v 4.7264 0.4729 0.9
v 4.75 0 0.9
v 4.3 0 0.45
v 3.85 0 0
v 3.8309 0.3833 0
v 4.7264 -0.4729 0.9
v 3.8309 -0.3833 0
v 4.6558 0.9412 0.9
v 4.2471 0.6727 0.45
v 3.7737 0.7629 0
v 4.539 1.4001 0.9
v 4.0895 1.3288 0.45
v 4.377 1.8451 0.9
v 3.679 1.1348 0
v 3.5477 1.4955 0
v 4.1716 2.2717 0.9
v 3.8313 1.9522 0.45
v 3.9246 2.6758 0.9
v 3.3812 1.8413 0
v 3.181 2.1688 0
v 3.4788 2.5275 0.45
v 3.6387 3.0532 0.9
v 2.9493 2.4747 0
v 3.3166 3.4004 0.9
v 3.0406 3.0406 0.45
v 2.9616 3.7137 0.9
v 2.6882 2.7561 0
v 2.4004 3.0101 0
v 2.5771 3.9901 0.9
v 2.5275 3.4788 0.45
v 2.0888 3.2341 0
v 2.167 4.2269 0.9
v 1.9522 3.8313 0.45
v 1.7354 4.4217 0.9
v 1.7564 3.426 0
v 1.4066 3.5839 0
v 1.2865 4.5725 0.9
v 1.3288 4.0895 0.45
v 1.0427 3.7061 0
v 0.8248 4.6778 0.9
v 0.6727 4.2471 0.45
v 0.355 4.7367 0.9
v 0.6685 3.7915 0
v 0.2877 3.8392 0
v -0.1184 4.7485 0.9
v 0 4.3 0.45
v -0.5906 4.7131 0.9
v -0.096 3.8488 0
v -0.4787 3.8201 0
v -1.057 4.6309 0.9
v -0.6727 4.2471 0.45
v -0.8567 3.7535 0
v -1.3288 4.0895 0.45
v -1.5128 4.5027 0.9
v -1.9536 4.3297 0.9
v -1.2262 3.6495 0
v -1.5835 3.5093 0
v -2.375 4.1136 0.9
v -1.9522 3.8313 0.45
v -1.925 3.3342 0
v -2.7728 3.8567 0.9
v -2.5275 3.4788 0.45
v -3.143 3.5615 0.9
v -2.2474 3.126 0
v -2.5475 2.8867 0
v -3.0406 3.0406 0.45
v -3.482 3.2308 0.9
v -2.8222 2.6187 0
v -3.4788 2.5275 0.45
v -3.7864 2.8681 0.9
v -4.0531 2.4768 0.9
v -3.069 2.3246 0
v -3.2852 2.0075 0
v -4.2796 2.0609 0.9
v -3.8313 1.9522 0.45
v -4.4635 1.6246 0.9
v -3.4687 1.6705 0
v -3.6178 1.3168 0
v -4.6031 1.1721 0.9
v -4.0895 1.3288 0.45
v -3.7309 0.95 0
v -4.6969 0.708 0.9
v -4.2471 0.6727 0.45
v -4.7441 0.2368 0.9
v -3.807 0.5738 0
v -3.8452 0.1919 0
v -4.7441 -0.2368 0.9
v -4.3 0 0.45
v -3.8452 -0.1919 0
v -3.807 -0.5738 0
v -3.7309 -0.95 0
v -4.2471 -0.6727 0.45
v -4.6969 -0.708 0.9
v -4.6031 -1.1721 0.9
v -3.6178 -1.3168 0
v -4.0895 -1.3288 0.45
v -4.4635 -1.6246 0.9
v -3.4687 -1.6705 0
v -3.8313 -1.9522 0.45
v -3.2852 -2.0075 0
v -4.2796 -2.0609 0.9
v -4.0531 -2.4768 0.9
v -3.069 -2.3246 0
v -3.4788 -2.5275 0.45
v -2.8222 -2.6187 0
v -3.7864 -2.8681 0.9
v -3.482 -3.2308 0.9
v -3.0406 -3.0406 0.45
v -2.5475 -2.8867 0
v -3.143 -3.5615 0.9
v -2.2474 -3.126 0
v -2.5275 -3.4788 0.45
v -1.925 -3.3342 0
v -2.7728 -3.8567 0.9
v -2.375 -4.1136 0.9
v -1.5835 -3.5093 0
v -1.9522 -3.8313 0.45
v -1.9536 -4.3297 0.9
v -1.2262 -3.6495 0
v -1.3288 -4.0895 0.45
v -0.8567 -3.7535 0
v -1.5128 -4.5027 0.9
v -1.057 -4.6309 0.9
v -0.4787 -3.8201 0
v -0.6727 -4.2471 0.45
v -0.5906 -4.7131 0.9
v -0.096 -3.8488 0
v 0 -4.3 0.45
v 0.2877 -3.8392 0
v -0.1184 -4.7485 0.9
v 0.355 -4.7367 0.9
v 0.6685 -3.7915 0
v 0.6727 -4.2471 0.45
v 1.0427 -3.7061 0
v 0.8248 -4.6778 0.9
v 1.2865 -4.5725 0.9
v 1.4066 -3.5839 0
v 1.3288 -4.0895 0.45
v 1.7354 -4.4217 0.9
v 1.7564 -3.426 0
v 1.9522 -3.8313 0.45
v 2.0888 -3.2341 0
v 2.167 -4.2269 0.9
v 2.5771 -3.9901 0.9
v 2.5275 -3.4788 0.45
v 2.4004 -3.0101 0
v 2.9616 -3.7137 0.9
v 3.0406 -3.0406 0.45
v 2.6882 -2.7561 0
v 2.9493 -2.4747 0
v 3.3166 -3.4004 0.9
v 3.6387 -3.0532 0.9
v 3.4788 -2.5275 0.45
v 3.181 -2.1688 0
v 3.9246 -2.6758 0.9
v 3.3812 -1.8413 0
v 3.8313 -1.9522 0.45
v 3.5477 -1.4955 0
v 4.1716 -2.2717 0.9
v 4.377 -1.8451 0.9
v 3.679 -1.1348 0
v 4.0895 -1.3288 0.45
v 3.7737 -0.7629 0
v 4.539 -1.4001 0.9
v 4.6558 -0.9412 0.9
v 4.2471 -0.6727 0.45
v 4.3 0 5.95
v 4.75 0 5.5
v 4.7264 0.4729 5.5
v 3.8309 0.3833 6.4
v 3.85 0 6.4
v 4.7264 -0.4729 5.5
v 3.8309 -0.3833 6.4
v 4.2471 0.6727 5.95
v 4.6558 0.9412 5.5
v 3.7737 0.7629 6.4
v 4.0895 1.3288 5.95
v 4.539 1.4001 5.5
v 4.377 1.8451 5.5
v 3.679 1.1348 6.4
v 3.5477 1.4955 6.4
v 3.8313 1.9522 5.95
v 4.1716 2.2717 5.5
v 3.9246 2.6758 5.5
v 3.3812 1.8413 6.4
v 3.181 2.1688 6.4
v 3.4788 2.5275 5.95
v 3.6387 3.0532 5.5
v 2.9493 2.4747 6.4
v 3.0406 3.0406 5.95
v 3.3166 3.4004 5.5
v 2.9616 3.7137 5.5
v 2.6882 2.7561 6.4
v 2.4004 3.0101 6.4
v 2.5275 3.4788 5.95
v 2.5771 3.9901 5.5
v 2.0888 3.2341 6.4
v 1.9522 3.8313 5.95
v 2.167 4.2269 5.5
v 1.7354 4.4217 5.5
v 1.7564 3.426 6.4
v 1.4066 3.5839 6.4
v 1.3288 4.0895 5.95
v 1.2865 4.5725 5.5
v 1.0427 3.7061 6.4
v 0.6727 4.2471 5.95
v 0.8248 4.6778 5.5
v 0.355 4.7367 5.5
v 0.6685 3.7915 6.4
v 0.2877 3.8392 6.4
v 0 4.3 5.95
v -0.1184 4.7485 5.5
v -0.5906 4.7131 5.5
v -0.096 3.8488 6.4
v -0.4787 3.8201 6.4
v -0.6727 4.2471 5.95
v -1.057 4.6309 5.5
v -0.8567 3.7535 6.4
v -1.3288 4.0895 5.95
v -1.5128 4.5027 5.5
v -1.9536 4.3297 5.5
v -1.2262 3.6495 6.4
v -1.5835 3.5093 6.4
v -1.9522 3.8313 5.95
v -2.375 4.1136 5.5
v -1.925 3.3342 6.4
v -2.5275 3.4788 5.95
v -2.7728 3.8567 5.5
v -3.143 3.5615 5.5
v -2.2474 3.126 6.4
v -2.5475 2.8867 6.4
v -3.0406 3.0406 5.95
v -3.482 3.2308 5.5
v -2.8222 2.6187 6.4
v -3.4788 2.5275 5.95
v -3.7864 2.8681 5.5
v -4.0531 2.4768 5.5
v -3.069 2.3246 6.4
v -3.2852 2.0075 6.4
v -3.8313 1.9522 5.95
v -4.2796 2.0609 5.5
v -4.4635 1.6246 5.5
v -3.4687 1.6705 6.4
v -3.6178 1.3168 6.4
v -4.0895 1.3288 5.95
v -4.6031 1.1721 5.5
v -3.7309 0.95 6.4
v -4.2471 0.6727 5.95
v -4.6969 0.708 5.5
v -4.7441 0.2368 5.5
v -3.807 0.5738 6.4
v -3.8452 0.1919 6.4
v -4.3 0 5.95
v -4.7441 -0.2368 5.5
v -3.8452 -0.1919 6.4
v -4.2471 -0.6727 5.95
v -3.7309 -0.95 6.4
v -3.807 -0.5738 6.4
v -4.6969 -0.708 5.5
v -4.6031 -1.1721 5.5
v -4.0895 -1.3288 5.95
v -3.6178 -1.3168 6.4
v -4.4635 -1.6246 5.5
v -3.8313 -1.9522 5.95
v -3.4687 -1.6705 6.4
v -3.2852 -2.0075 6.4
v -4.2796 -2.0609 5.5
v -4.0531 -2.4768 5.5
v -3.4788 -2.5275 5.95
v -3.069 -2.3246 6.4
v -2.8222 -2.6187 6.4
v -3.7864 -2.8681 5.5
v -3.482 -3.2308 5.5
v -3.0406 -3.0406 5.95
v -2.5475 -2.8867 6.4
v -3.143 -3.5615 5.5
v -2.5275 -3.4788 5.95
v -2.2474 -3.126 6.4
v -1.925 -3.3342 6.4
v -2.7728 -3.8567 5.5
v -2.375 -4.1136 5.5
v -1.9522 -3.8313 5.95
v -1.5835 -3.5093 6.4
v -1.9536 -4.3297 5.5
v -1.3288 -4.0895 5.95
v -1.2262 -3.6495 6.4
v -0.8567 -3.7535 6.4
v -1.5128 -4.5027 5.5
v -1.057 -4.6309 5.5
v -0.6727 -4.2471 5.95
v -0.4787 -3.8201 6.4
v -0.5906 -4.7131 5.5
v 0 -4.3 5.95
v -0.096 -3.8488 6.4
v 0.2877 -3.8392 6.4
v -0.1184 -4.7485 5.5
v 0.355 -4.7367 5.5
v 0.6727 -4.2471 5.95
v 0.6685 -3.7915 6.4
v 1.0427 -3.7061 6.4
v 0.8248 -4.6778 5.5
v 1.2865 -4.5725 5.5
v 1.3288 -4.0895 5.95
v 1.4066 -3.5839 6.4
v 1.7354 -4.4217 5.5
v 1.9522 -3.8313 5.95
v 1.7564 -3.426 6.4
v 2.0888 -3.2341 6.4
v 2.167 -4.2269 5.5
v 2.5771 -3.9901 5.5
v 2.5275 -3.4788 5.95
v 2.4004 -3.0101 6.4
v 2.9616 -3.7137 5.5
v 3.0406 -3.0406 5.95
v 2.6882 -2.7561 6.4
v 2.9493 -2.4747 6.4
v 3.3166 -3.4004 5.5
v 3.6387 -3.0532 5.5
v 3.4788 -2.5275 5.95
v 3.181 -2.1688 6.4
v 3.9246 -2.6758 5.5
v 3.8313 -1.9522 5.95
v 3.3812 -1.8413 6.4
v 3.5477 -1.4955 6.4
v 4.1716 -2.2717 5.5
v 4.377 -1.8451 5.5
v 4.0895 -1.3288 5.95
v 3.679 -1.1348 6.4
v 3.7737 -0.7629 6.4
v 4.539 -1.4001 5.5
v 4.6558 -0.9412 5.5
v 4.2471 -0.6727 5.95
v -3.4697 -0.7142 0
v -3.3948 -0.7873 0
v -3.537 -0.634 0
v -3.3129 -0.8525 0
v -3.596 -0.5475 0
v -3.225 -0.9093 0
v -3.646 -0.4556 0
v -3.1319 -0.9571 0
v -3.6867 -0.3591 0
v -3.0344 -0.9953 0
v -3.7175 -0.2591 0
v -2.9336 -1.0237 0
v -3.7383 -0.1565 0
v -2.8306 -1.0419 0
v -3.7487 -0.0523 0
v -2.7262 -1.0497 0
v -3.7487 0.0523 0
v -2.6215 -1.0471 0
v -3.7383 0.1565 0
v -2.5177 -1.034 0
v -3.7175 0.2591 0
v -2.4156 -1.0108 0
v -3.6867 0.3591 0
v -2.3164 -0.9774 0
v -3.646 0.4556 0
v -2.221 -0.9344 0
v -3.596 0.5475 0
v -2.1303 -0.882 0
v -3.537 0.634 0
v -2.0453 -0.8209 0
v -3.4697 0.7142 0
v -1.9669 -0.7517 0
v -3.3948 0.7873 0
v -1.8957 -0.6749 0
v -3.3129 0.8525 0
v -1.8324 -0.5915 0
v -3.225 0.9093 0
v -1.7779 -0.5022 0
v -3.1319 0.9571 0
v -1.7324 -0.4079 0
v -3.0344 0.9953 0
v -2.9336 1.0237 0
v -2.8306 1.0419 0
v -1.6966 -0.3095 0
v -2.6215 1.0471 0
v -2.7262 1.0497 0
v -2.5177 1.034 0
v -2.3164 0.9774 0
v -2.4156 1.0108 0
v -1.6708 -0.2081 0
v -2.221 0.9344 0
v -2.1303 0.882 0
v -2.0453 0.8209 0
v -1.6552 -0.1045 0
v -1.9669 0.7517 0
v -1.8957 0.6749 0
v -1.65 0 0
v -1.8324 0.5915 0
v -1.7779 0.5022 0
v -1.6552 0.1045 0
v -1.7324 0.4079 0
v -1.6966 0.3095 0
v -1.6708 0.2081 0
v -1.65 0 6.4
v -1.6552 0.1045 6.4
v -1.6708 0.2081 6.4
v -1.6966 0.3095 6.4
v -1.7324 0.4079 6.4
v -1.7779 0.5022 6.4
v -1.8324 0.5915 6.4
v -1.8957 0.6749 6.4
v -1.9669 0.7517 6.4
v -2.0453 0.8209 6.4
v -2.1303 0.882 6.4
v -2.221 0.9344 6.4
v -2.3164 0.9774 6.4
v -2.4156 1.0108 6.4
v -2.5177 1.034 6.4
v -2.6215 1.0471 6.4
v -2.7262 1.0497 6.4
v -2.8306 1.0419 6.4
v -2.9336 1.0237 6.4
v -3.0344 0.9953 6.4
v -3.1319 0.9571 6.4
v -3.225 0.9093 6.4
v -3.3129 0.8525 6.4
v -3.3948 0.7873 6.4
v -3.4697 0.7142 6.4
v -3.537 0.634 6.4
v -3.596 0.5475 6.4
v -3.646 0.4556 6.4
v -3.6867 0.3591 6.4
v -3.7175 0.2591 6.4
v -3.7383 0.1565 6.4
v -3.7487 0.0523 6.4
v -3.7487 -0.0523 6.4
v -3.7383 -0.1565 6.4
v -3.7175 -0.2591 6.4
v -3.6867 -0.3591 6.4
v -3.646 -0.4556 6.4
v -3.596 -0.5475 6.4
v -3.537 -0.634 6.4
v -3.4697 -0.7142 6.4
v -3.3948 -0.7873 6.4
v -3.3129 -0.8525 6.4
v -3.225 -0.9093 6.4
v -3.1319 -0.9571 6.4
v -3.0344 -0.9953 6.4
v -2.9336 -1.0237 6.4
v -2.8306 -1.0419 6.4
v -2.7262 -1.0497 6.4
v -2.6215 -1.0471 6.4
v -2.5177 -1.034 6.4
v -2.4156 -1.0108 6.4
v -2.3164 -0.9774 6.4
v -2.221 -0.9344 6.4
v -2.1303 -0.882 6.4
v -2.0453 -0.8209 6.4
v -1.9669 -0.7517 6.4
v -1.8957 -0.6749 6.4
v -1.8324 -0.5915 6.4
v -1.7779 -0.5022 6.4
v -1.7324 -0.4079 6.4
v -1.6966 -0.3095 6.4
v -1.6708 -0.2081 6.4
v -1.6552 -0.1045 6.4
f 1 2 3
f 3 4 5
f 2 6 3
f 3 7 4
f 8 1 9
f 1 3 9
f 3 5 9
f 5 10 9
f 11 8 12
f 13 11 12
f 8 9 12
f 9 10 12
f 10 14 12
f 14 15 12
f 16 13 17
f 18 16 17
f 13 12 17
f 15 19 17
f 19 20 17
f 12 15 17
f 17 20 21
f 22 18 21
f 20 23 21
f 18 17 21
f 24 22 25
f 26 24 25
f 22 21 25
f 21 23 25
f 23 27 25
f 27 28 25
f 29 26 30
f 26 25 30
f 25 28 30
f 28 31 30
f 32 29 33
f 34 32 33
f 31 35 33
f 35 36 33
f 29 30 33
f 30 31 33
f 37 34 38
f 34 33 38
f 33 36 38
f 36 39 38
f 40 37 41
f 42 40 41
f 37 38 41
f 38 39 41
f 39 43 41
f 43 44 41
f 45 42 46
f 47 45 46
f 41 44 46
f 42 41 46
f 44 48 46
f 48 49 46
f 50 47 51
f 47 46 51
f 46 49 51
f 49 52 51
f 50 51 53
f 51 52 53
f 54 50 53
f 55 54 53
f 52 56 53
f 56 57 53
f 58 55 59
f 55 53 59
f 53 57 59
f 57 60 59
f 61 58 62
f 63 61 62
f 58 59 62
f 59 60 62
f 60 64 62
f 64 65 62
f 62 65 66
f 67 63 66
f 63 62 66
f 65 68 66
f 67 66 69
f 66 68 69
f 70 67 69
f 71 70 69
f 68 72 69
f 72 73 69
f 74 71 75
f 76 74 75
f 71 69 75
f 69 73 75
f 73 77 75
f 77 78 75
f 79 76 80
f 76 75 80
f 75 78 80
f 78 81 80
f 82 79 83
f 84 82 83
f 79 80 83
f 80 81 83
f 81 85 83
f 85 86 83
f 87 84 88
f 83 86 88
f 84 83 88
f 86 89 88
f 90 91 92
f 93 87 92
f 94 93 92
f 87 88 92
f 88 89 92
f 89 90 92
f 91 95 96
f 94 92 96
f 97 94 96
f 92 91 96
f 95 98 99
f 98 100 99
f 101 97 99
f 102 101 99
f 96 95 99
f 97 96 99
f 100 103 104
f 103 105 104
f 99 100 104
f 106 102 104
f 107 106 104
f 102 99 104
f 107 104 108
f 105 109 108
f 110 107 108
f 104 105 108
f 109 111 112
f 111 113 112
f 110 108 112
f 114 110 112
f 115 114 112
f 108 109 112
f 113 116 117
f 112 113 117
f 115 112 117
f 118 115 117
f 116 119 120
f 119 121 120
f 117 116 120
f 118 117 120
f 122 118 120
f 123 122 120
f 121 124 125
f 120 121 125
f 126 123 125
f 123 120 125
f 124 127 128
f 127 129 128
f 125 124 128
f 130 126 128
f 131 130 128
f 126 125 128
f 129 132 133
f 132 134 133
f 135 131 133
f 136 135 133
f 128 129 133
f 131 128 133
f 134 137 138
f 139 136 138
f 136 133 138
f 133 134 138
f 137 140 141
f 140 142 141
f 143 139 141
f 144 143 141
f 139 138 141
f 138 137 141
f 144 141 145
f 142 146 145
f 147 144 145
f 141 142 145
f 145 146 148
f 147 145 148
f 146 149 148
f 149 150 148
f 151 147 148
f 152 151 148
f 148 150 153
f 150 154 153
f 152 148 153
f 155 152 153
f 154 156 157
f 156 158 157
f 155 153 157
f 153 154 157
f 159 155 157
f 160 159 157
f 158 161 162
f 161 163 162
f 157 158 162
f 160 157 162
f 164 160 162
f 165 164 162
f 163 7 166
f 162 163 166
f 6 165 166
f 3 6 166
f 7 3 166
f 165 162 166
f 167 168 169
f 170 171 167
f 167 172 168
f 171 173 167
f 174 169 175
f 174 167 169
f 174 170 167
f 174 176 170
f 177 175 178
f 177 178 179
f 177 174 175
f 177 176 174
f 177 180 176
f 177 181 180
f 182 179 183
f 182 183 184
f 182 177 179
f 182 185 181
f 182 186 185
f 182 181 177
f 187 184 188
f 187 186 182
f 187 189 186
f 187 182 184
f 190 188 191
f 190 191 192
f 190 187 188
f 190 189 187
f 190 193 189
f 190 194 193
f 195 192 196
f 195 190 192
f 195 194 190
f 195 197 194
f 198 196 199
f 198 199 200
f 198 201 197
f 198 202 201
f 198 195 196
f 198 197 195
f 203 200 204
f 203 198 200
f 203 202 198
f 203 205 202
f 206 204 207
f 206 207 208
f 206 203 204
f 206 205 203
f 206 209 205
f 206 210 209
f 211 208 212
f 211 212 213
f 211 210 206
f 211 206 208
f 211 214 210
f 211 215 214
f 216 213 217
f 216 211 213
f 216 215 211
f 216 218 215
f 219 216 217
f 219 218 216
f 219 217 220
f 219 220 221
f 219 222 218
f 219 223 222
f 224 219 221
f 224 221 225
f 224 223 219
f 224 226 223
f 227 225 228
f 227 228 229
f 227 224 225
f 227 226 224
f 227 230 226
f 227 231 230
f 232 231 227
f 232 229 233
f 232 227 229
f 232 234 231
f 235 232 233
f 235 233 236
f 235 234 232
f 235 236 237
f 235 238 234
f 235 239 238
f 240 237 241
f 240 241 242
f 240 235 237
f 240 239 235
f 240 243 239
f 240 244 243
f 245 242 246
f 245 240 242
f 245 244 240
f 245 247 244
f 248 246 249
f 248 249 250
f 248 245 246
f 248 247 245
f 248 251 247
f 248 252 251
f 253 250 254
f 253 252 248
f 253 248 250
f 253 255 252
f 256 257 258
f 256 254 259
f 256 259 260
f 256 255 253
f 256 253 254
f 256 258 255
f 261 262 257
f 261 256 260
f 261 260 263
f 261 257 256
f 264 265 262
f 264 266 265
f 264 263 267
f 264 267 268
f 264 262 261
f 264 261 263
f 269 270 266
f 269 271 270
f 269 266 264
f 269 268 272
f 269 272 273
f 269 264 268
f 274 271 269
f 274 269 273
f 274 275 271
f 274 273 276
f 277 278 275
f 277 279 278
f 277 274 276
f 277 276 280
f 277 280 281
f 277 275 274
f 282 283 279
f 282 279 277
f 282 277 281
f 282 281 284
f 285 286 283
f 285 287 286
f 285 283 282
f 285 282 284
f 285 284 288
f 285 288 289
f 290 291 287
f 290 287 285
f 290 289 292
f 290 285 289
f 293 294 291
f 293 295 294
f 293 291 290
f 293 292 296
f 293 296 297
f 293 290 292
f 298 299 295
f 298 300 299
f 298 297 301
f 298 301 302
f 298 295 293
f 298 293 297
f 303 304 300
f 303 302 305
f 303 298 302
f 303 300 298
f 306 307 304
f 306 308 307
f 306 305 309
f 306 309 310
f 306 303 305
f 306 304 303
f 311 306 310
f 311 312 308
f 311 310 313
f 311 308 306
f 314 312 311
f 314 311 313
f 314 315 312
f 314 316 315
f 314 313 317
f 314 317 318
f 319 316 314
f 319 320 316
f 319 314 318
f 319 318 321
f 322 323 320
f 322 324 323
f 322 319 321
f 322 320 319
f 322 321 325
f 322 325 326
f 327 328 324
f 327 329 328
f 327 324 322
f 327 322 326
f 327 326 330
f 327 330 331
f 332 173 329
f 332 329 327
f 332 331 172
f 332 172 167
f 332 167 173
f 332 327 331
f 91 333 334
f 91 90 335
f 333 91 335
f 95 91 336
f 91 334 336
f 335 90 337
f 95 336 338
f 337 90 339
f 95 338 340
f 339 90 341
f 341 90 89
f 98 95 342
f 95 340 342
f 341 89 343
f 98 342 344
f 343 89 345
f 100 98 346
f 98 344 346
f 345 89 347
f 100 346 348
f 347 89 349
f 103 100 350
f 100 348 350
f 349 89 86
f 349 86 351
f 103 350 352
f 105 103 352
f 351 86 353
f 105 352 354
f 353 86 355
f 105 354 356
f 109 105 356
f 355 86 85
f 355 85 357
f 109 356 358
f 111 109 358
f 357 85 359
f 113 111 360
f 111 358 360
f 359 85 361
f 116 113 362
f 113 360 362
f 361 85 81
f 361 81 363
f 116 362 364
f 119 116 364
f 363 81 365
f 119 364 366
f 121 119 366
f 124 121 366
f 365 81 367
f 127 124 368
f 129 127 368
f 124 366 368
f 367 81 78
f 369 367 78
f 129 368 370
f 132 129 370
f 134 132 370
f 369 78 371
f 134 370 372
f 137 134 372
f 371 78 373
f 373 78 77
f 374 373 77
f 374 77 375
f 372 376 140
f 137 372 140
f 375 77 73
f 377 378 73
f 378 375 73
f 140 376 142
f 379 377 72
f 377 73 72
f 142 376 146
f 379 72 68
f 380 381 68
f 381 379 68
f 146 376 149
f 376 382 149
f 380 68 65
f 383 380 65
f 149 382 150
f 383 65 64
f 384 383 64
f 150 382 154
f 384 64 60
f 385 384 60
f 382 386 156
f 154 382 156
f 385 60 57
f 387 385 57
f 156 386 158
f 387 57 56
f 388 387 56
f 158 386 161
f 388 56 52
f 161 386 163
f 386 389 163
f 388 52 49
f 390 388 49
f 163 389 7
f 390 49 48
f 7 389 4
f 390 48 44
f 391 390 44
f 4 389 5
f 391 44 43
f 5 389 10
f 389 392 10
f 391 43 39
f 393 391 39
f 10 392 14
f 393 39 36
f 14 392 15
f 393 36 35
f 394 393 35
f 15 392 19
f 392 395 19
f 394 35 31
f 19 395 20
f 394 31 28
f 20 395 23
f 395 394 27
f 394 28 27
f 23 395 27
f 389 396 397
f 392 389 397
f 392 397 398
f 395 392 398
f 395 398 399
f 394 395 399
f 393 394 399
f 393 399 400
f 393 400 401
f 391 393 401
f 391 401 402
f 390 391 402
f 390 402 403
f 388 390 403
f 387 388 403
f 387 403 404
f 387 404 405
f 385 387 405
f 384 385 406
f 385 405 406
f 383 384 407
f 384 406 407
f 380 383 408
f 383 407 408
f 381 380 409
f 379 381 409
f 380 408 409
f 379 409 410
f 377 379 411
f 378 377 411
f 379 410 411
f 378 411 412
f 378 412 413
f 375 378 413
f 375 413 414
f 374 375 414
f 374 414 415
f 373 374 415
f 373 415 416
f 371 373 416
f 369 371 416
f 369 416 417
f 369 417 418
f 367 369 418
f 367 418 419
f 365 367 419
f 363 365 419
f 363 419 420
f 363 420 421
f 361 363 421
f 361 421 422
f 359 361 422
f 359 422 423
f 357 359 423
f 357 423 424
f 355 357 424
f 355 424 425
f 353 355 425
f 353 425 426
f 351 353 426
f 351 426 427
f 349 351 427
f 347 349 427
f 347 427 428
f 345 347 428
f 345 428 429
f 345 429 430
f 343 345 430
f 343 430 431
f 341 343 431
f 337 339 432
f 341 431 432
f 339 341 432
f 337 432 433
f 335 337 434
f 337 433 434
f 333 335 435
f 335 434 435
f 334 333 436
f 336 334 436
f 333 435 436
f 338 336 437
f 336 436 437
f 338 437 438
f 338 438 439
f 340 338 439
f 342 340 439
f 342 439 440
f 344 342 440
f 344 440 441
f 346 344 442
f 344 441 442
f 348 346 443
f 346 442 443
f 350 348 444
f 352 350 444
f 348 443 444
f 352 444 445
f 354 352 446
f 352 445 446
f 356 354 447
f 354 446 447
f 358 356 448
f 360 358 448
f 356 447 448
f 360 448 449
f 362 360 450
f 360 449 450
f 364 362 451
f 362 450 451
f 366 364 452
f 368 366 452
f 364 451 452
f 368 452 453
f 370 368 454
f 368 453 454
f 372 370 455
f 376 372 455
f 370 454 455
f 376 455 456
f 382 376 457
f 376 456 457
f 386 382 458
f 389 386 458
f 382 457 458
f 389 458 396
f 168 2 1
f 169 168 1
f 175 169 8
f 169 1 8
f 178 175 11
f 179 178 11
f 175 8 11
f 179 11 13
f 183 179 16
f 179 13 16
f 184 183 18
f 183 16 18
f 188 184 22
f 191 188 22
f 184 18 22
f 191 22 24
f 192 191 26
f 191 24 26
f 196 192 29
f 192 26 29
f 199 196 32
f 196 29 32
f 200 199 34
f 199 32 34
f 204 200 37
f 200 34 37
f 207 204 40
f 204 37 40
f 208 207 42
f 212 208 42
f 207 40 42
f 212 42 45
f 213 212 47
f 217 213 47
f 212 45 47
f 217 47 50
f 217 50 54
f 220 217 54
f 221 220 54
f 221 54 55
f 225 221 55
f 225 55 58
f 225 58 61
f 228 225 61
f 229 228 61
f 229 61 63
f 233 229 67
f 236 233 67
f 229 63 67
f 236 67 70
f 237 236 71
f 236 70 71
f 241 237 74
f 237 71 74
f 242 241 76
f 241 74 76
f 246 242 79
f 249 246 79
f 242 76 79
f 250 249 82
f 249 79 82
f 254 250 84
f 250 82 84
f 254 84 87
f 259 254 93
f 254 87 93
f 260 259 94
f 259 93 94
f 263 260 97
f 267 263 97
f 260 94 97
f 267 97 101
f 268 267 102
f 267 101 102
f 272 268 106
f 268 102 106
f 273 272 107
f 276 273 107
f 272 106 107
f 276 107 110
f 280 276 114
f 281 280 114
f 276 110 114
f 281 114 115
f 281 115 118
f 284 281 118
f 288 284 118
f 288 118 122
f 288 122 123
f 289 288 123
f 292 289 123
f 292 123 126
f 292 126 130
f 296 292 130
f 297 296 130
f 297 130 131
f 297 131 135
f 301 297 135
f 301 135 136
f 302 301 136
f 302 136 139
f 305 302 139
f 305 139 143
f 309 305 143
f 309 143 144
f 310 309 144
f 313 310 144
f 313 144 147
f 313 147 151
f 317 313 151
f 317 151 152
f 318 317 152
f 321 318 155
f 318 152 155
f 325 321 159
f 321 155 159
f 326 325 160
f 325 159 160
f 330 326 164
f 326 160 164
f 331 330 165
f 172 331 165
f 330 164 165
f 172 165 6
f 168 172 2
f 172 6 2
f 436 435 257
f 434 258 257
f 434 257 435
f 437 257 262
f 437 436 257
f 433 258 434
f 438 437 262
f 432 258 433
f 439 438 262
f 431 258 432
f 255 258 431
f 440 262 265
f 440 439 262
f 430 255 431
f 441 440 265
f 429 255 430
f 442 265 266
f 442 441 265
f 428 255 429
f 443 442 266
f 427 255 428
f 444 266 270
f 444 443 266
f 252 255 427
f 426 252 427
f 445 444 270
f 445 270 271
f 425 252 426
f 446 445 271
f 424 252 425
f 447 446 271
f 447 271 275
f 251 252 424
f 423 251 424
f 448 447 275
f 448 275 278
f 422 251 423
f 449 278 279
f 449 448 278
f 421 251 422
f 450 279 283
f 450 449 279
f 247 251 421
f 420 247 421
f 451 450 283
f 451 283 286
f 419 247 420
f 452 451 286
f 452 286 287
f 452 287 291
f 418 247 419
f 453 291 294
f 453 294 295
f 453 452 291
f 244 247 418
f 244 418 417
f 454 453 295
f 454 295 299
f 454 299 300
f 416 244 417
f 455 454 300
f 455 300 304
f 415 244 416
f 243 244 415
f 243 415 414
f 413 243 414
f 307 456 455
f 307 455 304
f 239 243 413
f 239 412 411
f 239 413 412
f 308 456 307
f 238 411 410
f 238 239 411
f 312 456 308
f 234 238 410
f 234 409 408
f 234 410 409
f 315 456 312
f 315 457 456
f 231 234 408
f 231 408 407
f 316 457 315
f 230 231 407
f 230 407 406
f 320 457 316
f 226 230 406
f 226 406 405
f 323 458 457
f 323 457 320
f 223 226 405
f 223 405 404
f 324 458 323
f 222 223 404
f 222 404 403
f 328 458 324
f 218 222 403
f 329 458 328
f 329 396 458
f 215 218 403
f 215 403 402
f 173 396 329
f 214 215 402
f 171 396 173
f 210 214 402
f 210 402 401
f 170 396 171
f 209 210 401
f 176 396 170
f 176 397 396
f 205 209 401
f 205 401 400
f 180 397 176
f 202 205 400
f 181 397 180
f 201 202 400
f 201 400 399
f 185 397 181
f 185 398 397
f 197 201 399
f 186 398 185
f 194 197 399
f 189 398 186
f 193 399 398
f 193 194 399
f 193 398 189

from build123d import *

# Parameters (mm, degrees)
F0_R     = 4.75
F1_DEPTH = 6.4
F2_R     = 1.05
F3_DEPTH = 6.401
F4_SIZE  = 0.9


with BuildPart() as f1:
    # F0 (on Top) → F1 (new body)
    with BuildSketch(Plane.XY):
        Circle(F0_R)
    extrude(amount=F1_DEPTH)

    # F2 (on face) → F3 (cut, through all)
    with BuildSketch(Plane.XY.offset(6.4)):
        with Locations((-2.7, 0)):
            Circle(F2_R)
    extrude(amount=-F3_DEPTH, mode=Mode.SUBTRACT)

    # F4
    f4_edges = [f1.edges().sort_by_distance(p)[0] for p in [
        (-4.75, 0, 6.4),
        (-4.75, 0, 0),
    ]]
    chamfer(f4_edges, length=F4_SIZE)


solid = f1.part
